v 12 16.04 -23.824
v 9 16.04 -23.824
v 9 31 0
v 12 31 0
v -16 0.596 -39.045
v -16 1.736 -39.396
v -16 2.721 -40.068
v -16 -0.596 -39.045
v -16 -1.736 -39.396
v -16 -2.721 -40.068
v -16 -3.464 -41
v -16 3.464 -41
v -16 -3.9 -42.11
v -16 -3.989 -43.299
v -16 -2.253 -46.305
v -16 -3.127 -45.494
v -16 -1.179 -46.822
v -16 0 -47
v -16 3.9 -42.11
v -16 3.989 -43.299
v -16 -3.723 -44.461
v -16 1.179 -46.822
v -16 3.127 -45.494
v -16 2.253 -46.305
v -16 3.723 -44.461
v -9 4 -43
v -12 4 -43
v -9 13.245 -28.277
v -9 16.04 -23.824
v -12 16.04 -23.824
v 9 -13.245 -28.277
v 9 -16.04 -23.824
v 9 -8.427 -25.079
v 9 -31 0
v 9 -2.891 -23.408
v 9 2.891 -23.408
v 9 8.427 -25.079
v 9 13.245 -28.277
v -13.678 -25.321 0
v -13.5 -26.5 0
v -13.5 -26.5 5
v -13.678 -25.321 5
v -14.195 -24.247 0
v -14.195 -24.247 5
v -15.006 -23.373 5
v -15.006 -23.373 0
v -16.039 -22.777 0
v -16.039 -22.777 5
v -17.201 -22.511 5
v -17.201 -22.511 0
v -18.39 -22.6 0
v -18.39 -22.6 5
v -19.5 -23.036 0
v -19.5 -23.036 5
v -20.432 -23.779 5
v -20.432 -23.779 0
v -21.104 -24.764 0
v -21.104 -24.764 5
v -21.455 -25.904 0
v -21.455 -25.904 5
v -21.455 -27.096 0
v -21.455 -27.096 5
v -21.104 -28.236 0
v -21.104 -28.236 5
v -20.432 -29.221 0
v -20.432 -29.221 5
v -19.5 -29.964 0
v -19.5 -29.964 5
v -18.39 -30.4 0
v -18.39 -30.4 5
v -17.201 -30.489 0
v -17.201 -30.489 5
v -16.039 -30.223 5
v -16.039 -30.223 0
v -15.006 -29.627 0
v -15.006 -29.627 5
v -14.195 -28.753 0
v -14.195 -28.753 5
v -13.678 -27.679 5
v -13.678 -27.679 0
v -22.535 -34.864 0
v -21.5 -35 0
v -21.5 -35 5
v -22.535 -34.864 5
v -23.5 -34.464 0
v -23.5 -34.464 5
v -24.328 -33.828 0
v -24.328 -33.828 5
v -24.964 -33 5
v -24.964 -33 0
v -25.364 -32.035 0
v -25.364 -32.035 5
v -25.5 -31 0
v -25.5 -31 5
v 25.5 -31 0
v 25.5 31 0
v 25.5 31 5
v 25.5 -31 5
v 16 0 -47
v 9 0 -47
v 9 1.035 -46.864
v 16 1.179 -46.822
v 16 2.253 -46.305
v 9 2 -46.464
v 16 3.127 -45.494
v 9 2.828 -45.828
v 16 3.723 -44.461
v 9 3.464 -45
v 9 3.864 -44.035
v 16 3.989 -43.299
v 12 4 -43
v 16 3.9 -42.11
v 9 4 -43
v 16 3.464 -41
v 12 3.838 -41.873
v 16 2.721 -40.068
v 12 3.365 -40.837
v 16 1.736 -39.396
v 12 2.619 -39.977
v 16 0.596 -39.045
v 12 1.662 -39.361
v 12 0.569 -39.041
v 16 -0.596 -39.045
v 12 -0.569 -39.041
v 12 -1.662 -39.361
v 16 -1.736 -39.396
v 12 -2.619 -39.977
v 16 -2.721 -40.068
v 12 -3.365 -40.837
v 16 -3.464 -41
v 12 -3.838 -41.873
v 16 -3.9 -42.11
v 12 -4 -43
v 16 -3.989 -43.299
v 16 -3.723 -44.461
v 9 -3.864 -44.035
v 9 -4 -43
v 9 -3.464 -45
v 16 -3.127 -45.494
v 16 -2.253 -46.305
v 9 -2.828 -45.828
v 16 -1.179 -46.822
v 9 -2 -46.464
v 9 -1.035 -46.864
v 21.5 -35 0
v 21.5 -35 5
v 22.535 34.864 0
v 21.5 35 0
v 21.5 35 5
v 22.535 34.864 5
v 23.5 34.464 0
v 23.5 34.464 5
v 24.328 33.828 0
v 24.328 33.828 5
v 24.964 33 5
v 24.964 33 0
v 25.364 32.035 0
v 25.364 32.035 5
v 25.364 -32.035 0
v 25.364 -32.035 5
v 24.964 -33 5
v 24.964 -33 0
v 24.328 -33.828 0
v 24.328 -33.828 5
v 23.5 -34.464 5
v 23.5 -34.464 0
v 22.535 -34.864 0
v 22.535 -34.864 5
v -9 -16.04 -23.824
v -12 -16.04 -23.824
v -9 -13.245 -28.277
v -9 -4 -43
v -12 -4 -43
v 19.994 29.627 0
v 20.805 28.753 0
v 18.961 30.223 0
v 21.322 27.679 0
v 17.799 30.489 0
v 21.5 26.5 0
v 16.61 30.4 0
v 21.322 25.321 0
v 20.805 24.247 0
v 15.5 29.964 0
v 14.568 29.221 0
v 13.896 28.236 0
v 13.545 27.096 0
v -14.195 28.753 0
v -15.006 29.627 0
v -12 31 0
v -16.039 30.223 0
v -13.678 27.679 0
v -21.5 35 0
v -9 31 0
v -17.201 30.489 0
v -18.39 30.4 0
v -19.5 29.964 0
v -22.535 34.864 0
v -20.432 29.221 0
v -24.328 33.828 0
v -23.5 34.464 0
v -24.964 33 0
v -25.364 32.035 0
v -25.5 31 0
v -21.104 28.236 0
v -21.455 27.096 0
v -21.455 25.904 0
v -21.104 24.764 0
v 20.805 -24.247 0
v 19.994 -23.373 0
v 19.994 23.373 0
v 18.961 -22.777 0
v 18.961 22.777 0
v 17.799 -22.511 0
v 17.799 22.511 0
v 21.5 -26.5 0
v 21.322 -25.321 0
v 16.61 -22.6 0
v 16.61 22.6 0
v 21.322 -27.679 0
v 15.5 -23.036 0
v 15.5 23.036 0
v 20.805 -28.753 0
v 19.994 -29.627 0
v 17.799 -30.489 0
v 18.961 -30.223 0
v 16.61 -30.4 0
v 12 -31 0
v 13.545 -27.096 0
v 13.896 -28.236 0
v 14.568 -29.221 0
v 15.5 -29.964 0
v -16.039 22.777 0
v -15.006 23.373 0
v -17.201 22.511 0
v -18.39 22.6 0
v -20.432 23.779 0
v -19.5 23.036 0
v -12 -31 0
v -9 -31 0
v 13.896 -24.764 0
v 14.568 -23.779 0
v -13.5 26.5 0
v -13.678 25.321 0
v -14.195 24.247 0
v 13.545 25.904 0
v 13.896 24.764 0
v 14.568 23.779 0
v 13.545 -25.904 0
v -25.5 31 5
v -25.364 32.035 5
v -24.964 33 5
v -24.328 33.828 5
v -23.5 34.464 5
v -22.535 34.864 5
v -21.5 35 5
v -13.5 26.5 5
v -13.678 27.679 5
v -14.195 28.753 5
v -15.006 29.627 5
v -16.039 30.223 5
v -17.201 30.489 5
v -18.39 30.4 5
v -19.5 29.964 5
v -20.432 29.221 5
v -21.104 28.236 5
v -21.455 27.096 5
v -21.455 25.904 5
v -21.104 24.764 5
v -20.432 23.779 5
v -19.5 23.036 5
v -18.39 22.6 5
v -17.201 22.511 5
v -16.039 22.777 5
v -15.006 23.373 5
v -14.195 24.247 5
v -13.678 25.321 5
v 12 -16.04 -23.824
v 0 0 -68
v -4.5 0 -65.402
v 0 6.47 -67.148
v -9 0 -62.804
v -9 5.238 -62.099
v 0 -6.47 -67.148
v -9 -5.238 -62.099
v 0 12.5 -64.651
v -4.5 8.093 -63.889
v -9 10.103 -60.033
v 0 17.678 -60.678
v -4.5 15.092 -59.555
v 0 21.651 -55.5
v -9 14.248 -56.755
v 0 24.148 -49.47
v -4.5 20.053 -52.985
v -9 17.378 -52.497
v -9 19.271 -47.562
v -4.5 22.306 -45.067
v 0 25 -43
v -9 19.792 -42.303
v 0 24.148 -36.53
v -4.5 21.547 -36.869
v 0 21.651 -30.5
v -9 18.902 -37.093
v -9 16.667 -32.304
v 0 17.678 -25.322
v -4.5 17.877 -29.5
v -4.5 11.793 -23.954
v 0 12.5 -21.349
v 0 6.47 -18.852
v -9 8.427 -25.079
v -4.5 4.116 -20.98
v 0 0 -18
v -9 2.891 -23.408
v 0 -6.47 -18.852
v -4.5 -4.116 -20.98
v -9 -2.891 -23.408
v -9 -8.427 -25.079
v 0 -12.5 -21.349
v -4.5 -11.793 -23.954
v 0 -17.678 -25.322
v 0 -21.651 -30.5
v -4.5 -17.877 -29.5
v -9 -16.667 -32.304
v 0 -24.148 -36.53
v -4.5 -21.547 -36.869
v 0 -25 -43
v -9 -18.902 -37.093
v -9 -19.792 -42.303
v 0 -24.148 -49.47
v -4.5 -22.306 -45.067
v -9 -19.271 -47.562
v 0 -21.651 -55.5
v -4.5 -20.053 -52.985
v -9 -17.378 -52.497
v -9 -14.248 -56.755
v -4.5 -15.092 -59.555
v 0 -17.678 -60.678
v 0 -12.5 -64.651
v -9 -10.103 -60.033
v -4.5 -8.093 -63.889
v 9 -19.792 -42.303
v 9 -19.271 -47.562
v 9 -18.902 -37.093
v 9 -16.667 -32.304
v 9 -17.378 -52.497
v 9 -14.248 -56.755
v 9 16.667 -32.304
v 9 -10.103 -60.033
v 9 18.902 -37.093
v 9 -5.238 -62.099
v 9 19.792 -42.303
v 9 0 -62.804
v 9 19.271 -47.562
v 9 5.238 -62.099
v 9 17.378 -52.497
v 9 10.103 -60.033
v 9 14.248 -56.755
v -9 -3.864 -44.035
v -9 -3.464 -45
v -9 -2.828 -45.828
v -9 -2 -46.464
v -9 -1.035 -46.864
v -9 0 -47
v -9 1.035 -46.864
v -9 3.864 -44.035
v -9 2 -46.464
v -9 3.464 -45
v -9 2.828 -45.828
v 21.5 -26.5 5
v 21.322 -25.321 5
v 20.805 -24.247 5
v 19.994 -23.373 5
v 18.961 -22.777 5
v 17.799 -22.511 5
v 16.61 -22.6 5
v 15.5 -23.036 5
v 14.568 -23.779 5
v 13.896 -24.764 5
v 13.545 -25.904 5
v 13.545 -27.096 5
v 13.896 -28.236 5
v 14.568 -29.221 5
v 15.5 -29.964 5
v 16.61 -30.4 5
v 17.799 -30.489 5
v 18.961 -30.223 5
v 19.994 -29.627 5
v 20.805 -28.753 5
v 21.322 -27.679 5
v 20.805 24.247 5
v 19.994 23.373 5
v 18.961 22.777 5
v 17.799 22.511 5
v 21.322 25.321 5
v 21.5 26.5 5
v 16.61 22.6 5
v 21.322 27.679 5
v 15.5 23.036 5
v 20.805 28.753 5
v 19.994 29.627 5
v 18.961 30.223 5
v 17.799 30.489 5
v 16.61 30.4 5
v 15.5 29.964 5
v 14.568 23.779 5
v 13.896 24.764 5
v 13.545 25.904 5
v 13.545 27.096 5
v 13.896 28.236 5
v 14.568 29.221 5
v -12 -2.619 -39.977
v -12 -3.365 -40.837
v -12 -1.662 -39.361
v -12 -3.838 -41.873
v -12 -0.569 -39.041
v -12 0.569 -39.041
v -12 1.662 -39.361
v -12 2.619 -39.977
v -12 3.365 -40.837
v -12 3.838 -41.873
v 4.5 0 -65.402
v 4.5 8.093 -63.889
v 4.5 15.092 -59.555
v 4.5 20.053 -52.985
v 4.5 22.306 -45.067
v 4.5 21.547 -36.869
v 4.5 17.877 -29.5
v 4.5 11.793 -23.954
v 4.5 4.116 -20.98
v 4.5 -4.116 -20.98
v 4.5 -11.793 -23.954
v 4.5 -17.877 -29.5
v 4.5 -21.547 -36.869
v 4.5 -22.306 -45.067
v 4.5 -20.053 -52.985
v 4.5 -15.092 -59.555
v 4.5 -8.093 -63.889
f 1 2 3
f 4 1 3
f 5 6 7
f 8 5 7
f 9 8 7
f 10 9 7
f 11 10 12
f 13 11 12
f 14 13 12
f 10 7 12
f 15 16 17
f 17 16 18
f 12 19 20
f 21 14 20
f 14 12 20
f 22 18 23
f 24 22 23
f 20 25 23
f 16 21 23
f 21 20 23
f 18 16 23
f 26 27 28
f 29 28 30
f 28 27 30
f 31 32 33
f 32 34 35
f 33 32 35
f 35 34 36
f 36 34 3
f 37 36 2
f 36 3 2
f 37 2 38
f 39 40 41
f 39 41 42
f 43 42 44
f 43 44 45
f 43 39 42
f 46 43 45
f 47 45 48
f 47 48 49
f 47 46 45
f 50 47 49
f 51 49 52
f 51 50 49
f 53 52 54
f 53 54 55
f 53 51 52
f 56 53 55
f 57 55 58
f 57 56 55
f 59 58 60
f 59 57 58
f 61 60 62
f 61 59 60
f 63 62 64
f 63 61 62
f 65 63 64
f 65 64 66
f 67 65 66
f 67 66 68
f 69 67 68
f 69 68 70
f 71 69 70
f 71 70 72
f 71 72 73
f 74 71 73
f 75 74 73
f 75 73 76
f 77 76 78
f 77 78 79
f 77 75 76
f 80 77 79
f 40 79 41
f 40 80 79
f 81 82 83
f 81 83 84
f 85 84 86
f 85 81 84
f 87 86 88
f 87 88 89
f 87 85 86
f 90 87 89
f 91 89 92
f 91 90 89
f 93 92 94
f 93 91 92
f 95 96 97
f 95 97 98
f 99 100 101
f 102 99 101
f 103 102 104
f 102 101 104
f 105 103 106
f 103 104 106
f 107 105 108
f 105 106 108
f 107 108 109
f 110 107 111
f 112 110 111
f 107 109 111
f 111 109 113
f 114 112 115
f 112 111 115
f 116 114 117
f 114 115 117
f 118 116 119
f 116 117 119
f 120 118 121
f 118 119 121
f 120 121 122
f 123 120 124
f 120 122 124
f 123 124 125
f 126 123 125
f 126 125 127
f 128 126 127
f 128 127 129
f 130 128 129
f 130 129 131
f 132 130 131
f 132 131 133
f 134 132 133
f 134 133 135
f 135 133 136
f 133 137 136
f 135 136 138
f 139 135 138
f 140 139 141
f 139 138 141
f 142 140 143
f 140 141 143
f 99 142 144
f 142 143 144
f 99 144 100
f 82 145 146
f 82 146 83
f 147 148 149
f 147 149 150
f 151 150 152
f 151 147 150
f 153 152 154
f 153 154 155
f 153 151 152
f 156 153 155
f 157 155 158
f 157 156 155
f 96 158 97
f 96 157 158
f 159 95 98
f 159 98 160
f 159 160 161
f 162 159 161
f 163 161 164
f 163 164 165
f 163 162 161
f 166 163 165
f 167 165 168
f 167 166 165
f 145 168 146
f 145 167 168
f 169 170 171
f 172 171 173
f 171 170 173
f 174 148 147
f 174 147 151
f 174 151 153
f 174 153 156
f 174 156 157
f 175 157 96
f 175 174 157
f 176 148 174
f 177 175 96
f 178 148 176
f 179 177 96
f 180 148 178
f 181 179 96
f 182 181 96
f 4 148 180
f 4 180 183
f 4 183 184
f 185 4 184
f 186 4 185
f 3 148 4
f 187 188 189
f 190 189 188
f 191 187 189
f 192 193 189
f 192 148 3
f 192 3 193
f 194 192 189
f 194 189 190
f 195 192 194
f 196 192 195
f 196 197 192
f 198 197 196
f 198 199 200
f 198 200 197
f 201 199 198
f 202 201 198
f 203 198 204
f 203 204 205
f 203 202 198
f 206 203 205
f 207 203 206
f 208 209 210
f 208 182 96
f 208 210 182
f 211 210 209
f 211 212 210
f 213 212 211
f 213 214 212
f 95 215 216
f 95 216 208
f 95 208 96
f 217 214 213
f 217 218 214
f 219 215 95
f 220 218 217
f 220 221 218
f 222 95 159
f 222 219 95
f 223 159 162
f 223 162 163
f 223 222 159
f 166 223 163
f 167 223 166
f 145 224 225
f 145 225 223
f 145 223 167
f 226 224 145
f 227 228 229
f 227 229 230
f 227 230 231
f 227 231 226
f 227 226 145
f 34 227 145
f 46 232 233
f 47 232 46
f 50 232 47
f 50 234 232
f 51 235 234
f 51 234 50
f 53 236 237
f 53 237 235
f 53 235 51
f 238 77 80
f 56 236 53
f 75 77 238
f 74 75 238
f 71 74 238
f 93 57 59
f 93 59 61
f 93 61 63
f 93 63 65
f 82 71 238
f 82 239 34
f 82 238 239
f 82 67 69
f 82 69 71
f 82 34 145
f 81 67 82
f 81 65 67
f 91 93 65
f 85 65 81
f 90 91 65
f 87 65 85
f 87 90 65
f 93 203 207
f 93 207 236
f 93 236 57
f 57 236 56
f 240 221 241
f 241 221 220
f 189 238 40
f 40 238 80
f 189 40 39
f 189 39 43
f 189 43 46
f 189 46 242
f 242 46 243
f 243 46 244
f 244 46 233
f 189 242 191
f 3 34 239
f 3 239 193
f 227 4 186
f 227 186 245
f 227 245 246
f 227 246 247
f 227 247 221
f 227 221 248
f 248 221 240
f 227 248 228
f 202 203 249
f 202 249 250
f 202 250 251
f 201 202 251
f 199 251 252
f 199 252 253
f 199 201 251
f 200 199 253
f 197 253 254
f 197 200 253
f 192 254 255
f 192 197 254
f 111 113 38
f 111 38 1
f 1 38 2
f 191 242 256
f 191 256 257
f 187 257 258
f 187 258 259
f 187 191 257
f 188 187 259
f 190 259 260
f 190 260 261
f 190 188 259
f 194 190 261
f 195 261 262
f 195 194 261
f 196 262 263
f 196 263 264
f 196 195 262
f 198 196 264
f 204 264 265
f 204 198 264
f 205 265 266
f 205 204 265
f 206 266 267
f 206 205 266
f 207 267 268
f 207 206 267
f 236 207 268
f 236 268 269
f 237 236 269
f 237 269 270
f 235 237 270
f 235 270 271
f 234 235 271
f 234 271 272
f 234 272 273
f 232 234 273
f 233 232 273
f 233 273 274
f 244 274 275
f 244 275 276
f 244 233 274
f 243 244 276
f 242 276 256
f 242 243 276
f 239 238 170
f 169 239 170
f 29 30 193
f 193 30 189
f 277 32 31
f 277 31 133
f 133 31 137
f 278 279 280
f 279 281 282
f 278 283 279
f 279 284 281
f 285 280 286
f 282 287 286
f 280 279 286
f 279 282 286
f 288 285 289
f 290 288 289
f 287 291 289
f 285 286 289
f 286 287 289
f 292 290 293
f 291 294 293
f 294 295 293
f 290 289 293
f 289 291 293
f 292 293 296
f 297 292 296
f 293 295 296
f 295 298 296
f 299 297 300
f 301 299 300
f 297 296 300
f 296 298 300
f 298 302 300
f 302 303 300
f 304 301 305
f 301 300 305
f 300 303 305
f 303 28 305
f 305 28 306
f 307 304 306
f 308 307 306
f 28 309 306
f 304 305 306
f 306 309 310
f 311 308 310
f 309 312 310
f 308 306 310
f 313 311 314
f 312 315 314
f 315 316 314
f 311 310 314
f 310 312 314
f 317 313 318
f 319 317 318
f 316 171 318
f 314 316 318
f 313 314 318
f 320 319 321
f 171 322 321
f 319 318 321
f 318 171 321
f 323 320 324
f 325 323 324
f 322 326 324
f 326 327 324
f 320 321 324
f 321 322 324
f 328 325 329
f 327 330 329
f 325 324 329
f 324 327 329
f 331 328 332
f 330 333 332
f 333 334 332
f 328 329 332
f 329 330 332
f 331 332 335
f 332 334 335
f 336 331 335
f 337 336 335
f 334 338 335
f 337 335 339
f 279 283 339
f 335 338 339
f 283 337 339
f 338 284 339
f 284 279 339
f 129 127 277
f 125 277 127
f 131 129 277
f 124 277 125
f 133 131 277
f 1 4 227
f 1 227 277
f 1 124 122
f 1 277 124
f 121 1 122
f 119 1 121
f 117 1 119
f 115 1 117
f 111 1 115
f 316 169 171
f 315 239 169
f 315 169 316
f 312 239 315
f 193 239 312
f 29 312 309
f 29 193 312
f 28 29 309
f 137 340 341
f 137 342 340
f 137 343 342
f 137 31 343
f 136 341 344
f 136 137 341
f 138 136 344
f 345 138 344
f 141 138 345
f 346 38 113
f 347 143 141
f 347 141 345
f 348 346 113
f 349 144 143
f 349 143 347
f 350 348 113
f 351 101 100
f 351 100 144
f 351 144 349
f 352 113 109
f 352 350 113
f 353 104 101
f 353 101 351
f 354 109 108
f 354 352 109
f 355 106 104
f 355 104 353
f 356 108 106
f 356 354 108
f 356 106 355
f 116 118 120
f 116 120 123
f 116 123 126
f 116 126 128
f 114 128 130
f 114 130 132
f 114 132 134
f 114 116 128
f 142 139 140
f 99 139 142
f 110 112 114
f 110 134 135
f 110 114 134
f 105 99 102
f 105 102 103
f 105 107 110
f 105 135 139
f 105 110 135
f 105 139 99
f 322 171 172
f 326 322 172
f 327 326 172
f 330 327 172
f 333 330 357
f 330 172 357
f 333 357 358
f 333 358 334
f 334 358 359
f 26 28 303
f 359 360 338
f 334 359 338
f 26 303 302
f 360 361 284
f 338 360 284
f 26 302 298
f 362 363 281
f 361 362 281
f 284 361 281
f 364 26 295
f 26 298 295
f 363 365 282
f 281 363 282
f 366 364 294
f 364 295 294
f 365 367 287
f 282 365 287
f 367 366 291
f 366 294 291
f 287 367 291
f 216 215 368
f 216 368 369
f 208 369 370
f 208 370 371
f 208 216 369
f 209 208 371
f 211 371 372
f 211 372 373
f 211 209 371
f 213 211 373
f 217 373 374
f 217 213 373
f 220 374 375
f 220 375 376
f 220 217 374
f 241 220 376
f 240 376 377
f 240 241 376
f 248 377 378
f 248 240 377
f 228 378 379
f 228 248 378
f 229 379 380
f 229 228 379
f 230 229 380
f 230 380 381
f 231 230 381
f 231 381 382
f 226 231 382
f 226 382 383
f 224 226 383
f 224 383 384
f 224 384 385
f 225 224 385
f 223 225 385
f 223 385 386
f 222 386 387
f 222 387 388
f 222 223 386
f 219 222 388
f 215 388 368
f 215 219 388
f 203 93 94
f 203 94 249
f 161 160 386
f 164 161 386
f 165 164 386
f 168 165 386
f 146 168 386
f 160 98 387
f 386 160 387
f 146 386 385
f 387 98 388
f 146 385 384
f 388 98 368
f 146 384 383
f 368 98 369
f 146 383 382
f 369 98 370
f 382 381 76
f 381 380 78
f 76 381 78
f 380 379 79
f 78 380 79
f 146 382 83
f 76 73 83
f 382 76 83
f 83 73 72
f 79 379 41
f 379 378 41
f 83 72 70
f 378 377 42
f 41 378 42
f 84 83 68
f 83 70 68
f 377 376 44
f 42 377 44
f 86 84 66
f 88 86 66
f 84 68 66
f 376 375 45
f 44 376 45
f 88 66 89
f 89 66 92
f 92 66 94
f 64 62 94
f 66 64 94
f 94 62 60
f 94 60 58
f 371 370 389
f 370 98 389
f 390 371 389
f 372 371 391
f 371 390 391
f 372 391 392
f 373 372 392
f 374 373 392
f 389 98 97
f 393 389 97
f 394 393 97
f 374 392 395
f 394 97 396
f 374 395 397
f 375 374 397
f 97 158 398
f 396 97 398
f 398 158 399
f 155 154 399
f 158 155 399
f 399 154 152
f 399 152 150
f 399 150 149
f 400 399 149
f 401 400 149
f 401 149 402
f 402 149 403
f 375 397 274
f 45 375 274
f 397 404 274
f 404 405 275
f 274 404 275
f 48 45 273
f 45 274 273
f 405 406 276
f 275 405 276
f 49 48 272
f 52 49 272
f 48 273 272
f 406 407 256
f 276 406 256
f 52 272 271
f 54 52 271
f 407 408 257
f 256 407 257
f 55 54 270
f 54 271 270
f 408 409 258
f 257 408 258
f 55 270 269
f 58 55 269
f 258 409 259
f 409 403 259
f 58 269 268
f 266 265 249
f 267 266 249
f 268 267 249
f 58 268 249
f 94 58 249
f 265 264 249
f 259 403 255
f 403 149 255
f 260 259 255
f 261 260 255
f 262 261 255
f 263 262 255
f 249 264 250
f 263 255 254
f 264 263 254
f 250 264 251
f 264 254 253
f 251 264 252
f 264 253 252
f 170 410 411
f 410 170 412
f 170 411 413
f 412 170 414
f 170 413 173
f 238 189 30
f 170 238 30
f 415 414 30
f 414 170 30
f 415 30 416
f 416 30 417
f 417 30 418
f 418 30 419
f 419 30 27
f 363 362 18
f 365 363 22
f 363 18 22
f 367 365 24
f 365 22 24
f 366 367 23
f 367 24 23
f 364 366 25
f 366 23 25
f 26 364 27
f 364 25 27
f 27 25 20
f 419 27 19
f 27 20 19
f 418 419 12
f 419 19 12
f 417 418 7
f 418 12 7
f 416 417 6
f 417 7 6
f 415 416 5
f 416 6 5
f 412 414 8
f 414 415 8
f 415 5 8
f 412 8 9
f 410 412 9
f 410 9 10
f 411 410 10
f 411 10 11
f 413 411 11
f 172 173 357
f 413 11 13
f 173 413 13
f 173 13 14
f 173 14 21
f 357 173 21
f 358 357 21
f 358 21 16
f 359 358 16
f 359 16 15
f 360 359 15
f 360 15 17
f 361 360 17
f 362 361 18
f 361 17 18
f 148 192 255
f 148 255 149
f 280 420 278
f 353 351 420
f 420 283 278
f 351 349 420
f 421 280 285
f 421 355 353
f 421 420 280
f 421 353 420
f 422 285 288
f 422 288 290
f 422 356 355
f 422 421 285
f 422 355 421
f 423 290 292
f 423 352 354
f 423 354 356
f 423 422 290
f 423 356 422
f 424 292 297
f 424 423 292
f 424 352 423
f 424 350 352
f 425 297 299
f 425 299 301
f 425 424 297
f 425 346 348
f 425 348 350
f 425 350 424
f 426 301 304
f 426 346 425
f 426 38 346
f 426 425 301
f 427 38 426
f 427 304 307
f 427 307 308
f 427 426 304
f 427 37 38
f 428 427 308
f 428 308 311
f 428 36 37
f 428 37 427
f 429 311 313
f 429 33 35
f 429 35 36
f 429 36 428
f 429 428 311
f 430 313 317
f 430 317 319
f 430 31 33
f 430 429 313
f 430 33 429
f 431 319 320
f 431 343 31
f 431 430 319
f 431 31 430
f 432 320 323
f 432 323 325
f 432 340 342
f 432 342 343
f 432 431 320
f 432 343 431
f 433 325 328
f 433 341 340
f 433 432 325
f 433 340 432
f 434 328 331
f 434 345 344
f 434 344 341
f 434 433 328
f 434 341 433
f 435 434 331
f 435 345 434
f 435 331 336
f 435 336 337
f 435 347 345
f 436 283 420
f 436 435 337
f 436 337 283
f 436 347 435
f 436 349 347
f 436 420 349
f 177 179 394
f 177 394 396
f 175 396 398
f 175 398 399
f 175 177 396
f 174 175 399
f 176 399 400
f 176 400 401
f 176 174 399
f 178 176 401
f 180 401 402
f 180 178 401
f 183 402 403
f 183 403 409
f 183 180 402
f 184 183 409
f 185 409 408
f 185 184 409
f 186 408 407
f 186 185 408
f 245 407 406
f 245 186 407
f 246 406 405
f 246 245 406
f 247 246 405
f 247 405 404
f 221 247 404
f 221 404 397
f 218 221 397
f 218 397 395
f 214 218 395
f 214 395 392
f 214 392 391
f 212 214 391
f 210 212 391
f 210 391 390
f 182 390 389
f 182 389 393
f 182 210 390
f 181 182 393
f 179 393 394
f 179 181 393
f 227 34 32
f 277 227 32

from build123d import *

# Parameters (mm, degrees)
SKETCH_1_R                = 4
EXTRUDE_1_DEPTH           = 5
EXTRUDE_2_DEPTH           = 12
EXTRUDE_2_DEPTH_BACK      = 12
EXTRUDE_3_DEPTH           = 16
EXTRUDE_3_DEPTH_BACK      = 16
CUT_EXTRUDE_1_DEPTH       = 9
CUT_EXTRUDE_1_DEPTH_BACK  = 9
SKETCH_2_5_R              = 25
EXTRUDE_4_DEPTH           = 9
EXTRUDE_4_TAPER           = 30
EXTRUDE_4_OTHER_WAY_DEPTH = 9
EXTRUDE_4_OTHER_WAY_TAPER = 30


with BuildPart() as part:
    # 草图1 → 凸台-拉伸1 (new body)
    with BuildSketch(Plane.XY):
        with BuildLine():
            Line((21.5, -35), (-21.5, -35))
            ThreePointArc((-21.5, -35), (-24.328427125, -33.828427125), (-25.5, -31))
            Line((-25.5, -31), (-25.5, 31))
            ThreePointArc((-25.5, 31), (-24.328427125, 33.828427125), (-21.5, 35))
            Line((-21.5, 35), (21.5, 35))
            ThreePointArc((21.5, 35), (24.328427125, 33.828427125), (25.5, 31))
            Line((25.5, 31), (25.5, -31))
            ThreePointArc((25.5, -31), (24.328427125, -33.828427125), (21.5, -35))
        make_face()
        with Locations((-17.5, 26.5)):
            Circle(SKETCH_1_R, mode=Mode.SUBTRACT)
        with Locations((17.5, 26.5)):
            Circle(SKETCH_1_R, mode=Mode.SUBTRACT)
        with Locations((17.5, -26.5)):
            Circle(SKETCH_1_R, mode=Mode.SUBTRACT)
        with Locations((-17.5, -26.5)):
            Circle(SKETCH_1_R, mode=Mode.SUBTRACT)
    extrude(amount=EXTRUDE_1_DEPTH)

    # 草图2 → 凸台-拉伸2 (add, two sides: drawn at the far end of the back side and taken through both)
    with BuildSketch(Plane(origin=(0, 0, 0), x_dir=(0, 0, -1), z_dir=(1, 0, 0)).offset(-EXTRUDE_2_DEPTH_BACK)):
        with BuildLine():
            ThreePointArc((43, -4), (39, 0), (43, 4))
            Line((43, 4), (0, 31))
            Line((0, 31), (0, -31))
            Line((0, -31), (43, -4))
        make_face()
    extrude(amount=EXTRUDE_2_DEPTH + EXTRUDE_2_DEPTH_BACK)

    # 草图2<3> → 凸台-拉伸3 (add, two sides: drawn at the far end of the back side and taken through both)
    with BuildSketch(Plane(origin=(0, 0, 0), x_dir=(0, 0, -1), z_dir=(1, 0, 0)).offset(-EXTRUDE_3_DEPTH_BACK)):
        with BuildLine():
            ThreePointArc((47, 0), (45.828427125, 2.828427125), (43, 4))
            ThreePointArc((43, 4), (39, 0), (43, -4))
            ThreePointArc((43, -4), (45.828427125, -2.828427125), (47, 0))
        make_face()
    extrude(amount=EXTRUDE_3_DEPTH + EXTRUDE_3_DEPTH_BACK)

    # 草图2<4> → 切除-拉伸1 (cut, two sides: drawn at the far end of the back side and taken through both)
    with BuildSketch(Plane(origin=(0, 0, 0), x_dir=(0, 0, -1), z_dir=(1, 0, 0)).offset(-CUT_EXTRUDE_1_DEPTH_BACK)):
        with BuildLine():
            ThreePointArc((43, -4), (47, 0), (43, 4))
            Line((43, 4), (0, 31))
            Line((0, 31), (0, -31))
            Line((0, -31), (43, -4))
        make_face()
    extrude(amount=CUT_EXTRUDE_1_DEPTH + CUT_EXTRUDE_1_DEPTH_BACK, mode=Mode.SUBTRACT)

    # 草图2<5> → 凸台-拉伸4 (add)
    with BuildSketch(Plane(origin=(0, 0, 0), x_dir=(0, 0, -1), z_dir=(1, 0, 0))):
        with Locations((43, 0)):
            Circle(SKETCH_2_5_R)
    extrude(amount=EXTRUDE_4_DEPTH, taper=EXTRUDE_4_TAPER)

    # 草图2<5> → 凸台-拉伸4 other way (add)
    with BuildSketch(Plane(origin=(0, 0, 0), x_dir=(0, 0, -1), z_dir=(1, 0, 0))):
        with Locations((43, 0)):
            Circle(SKETCH_2_5_R)
    extrude(amount=-EXTRUDE_4_OTHER_WAY_DEPTH, taper=EXTRUDE_4_OTHER_WAY_TAPER)


solid = part.part
